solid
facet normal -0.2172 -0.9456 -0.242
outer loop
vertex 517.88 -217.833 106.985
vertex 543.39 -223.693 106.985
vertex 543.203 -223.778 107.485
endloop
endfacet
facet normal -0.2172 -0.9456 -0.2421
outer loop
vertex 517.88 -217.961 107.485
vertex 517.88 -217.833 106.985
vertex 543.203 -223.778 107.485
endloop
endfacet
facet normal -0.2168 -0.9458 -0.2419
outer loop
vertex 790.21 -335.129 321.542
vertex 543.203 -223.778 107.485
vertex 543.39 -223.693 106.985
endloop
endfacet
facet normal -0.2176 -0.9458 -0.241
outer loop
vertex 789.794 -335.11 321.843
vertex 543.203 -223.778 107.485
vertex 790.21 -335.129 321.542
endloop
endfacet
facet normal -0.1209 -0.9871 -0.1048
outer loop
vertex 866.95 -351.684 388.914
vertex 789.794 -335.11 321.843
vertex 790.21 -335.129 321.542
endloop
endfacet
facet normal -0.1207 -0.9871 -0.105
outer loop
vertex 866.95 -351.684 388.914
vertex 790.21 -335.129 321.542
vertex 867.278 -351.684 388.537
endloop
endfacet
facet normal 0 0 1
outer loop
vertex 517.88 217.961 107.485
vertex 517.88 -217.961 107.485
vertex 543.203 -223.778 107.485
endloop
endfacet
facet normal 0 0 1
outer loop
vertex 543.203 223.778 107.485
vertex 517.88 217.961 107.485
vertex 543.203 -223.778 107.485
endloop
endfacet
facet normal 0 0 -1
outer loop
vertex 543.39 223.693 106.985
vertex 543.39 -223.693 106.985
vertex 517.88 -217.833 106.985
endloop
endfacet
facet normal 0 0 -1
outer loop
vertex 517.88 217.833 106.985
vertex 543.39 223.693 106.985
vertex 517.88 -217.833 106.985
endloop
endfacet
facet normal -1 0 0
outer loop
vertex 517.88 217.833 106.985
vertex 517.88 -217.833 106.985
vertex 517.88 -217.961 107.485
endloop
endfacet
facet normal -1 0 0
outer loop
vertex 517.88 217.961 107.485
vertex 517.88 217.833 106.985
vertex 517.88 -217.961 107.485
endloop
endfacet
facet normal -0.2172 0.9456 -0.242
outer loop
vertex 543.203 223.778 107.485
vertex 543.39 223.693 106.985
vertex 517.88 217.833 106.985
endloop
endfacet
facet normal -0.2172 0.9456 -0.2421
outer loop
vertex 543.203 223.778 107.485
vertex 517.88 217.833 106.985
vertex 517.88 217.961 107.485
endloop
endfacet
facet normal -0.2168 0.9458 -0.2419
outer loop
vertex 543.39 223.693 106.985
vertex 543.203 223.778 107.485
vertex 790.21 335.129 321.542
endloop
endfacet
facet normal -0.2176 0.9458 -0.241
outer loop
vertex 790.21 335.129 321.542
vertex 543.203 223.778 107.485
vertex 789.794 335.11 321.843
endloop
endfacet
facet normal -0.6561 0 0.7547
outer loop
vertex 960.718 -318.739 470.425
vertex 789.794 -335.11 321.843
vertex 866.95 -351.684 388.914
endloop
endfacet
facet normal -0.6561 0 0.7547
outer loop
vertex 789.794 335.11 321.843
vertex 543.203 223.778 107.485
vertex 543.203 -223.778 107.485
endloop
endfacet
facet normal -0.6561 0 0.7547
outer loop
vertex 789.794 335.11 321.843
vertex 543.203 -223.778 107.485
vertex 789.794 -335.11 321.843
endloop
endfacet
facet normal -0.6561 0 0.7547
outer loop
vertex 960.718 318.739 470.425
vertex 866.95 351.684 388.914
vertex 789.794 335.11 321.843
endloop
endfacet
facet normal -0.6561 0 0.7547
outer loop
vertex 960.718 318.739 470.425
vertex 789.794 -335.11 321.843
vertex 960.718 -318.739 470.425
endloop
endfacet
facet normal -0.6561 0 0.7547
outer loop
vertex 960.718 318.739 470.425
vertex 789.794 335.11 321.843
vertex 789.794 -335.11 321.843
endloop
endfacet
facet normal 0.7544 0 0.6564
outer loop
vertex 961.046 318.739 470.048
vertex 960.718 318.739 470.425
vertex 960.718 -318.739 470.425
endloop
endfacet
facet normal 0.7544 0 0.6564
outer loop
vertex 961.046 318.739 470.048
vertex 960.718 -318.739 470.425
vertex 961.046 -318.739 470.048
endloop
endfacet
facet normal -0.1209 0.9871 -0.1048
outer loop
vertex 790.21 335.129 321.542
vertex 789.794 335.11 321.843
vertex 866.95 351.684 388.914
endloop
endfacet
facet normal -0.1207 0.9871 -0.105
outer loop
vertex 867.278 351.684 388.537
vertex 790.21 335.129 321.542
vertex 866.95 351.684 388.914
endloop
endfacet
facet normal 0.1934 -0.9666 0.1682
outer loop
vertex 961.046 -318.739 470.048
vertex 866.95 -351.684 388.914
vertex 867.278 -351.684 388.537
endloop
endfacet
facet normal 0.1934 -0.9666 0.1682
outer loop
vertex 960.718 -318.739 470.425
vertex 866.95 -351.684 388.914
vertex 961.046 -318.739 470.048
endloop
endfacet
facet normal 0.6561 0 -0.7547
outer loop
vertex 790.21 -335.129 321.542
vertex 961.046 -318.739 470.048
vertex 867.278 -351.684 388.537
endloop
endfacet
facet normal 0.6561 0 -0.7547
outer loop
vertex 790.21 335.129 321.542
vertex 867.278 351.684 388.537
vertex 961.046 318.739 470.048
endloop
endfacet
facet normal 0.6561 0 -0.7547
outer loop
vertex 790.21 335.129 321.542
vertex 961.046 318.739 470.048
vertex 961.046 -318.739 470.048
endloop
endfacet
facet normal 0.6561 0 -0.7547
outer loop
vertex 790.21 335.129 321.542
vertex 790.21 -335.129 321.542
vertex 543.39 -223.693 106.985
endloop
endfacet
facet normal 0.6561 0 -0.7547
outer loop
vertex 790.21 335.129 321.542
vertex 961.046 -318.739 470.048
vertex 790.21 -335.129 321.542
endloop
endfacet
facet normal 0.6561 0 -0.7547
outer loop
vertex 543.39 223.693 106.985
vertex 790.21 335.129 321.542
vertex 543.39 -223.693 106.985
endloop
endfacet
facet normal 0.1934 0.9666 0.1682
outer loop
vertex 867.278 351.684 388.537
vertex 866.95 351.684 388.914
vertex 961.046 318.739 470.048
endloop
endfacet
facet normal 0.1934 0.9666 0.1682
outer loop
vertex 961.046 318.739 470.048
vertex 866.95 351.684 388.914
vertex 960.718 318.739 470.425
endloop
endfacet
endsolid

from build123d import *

# Parameters (mm, degrees)
WYCI_GNI_CIE_CIENKA_CIANKA1_DEPTH      = 400
WYCI_GNI_CIE_CIENKA_CIANKA1_DEPTH_BACK = 400


# Read off the part's stored shape, not the designer's step: Lustro1
with BuildPart() as part:
    # Szkic1 → Wyciągnięcie-cienka ścianka1 (new, two sides: drawn at the far end of the back side and taken through both)
    with BuildSketch(Plane(origin=(0, 0, 0), x_dir=(1, 0, 0), z_dir=(0, 1, 0)).offset(-WYCI_GNI_CIE_CIENKA_CIANKA1_DEPTH_BACK)):
        Polygon((961.046281695, -470.048059203), (543.39, -106.98499256), (517.88, -106.98499256), (517.88, -107.48499256), (543.20305766, -107.48499256), (960.718252181, -470.425413993), align=None)
    extrude(amount=WYCI_GNI_CIE_CIENKA_CIANKA1_DEPTH + WYCI_GNI_CIE_CIENKA_CIANKA1_DEPTH_BACK)

    # Cięcie powierzchnią1
    split(bisect_by=Plane(origin=(-24.349944471, -199.016868, -21.167083796), x_dir=(0.7449832908348125, -0.1600276007809854, 0.6476040946173941), z_dir=(-0.12077436340947467, -0.987112540183885, -0.10498755238005406)), keep=Keep.BOTTOM)

    # Cięcie powierzchnią2
    split(bisect_by=Plane(origin=(110.843151094, -553.888363867, 96.354481224), x_dir=(0.7294998198065532, 0.25630205312360615, 0.6341445185971655), z_dir=(0.19343361492315114, -0.9665967398893007, 0.1681492761005468)), keep=Keep.BOTTOM)

    # Cięcie powierzchnią3
    split(bisect_by=Plane(origin=(-14.708403282, -64.029657214, -16.335336758), x_dir=(0.6328754019353329, -0.32469887066665304, 0.7028793417173329), z_dir=(-0.21726595221314635, -0.9458174471787884, -0.24129828557433775)), keep=Keep.BOTTOM)

    # Lustro1
    split(bisect_by=Plane.ZX, keep=Keep.BOTTOM)

    # Lustro1 2: part across plane


with BuildPart() as part_1:
    add(part.part)
    add(part.part.mirror(Plane.ZX))


solid = part_1.part
